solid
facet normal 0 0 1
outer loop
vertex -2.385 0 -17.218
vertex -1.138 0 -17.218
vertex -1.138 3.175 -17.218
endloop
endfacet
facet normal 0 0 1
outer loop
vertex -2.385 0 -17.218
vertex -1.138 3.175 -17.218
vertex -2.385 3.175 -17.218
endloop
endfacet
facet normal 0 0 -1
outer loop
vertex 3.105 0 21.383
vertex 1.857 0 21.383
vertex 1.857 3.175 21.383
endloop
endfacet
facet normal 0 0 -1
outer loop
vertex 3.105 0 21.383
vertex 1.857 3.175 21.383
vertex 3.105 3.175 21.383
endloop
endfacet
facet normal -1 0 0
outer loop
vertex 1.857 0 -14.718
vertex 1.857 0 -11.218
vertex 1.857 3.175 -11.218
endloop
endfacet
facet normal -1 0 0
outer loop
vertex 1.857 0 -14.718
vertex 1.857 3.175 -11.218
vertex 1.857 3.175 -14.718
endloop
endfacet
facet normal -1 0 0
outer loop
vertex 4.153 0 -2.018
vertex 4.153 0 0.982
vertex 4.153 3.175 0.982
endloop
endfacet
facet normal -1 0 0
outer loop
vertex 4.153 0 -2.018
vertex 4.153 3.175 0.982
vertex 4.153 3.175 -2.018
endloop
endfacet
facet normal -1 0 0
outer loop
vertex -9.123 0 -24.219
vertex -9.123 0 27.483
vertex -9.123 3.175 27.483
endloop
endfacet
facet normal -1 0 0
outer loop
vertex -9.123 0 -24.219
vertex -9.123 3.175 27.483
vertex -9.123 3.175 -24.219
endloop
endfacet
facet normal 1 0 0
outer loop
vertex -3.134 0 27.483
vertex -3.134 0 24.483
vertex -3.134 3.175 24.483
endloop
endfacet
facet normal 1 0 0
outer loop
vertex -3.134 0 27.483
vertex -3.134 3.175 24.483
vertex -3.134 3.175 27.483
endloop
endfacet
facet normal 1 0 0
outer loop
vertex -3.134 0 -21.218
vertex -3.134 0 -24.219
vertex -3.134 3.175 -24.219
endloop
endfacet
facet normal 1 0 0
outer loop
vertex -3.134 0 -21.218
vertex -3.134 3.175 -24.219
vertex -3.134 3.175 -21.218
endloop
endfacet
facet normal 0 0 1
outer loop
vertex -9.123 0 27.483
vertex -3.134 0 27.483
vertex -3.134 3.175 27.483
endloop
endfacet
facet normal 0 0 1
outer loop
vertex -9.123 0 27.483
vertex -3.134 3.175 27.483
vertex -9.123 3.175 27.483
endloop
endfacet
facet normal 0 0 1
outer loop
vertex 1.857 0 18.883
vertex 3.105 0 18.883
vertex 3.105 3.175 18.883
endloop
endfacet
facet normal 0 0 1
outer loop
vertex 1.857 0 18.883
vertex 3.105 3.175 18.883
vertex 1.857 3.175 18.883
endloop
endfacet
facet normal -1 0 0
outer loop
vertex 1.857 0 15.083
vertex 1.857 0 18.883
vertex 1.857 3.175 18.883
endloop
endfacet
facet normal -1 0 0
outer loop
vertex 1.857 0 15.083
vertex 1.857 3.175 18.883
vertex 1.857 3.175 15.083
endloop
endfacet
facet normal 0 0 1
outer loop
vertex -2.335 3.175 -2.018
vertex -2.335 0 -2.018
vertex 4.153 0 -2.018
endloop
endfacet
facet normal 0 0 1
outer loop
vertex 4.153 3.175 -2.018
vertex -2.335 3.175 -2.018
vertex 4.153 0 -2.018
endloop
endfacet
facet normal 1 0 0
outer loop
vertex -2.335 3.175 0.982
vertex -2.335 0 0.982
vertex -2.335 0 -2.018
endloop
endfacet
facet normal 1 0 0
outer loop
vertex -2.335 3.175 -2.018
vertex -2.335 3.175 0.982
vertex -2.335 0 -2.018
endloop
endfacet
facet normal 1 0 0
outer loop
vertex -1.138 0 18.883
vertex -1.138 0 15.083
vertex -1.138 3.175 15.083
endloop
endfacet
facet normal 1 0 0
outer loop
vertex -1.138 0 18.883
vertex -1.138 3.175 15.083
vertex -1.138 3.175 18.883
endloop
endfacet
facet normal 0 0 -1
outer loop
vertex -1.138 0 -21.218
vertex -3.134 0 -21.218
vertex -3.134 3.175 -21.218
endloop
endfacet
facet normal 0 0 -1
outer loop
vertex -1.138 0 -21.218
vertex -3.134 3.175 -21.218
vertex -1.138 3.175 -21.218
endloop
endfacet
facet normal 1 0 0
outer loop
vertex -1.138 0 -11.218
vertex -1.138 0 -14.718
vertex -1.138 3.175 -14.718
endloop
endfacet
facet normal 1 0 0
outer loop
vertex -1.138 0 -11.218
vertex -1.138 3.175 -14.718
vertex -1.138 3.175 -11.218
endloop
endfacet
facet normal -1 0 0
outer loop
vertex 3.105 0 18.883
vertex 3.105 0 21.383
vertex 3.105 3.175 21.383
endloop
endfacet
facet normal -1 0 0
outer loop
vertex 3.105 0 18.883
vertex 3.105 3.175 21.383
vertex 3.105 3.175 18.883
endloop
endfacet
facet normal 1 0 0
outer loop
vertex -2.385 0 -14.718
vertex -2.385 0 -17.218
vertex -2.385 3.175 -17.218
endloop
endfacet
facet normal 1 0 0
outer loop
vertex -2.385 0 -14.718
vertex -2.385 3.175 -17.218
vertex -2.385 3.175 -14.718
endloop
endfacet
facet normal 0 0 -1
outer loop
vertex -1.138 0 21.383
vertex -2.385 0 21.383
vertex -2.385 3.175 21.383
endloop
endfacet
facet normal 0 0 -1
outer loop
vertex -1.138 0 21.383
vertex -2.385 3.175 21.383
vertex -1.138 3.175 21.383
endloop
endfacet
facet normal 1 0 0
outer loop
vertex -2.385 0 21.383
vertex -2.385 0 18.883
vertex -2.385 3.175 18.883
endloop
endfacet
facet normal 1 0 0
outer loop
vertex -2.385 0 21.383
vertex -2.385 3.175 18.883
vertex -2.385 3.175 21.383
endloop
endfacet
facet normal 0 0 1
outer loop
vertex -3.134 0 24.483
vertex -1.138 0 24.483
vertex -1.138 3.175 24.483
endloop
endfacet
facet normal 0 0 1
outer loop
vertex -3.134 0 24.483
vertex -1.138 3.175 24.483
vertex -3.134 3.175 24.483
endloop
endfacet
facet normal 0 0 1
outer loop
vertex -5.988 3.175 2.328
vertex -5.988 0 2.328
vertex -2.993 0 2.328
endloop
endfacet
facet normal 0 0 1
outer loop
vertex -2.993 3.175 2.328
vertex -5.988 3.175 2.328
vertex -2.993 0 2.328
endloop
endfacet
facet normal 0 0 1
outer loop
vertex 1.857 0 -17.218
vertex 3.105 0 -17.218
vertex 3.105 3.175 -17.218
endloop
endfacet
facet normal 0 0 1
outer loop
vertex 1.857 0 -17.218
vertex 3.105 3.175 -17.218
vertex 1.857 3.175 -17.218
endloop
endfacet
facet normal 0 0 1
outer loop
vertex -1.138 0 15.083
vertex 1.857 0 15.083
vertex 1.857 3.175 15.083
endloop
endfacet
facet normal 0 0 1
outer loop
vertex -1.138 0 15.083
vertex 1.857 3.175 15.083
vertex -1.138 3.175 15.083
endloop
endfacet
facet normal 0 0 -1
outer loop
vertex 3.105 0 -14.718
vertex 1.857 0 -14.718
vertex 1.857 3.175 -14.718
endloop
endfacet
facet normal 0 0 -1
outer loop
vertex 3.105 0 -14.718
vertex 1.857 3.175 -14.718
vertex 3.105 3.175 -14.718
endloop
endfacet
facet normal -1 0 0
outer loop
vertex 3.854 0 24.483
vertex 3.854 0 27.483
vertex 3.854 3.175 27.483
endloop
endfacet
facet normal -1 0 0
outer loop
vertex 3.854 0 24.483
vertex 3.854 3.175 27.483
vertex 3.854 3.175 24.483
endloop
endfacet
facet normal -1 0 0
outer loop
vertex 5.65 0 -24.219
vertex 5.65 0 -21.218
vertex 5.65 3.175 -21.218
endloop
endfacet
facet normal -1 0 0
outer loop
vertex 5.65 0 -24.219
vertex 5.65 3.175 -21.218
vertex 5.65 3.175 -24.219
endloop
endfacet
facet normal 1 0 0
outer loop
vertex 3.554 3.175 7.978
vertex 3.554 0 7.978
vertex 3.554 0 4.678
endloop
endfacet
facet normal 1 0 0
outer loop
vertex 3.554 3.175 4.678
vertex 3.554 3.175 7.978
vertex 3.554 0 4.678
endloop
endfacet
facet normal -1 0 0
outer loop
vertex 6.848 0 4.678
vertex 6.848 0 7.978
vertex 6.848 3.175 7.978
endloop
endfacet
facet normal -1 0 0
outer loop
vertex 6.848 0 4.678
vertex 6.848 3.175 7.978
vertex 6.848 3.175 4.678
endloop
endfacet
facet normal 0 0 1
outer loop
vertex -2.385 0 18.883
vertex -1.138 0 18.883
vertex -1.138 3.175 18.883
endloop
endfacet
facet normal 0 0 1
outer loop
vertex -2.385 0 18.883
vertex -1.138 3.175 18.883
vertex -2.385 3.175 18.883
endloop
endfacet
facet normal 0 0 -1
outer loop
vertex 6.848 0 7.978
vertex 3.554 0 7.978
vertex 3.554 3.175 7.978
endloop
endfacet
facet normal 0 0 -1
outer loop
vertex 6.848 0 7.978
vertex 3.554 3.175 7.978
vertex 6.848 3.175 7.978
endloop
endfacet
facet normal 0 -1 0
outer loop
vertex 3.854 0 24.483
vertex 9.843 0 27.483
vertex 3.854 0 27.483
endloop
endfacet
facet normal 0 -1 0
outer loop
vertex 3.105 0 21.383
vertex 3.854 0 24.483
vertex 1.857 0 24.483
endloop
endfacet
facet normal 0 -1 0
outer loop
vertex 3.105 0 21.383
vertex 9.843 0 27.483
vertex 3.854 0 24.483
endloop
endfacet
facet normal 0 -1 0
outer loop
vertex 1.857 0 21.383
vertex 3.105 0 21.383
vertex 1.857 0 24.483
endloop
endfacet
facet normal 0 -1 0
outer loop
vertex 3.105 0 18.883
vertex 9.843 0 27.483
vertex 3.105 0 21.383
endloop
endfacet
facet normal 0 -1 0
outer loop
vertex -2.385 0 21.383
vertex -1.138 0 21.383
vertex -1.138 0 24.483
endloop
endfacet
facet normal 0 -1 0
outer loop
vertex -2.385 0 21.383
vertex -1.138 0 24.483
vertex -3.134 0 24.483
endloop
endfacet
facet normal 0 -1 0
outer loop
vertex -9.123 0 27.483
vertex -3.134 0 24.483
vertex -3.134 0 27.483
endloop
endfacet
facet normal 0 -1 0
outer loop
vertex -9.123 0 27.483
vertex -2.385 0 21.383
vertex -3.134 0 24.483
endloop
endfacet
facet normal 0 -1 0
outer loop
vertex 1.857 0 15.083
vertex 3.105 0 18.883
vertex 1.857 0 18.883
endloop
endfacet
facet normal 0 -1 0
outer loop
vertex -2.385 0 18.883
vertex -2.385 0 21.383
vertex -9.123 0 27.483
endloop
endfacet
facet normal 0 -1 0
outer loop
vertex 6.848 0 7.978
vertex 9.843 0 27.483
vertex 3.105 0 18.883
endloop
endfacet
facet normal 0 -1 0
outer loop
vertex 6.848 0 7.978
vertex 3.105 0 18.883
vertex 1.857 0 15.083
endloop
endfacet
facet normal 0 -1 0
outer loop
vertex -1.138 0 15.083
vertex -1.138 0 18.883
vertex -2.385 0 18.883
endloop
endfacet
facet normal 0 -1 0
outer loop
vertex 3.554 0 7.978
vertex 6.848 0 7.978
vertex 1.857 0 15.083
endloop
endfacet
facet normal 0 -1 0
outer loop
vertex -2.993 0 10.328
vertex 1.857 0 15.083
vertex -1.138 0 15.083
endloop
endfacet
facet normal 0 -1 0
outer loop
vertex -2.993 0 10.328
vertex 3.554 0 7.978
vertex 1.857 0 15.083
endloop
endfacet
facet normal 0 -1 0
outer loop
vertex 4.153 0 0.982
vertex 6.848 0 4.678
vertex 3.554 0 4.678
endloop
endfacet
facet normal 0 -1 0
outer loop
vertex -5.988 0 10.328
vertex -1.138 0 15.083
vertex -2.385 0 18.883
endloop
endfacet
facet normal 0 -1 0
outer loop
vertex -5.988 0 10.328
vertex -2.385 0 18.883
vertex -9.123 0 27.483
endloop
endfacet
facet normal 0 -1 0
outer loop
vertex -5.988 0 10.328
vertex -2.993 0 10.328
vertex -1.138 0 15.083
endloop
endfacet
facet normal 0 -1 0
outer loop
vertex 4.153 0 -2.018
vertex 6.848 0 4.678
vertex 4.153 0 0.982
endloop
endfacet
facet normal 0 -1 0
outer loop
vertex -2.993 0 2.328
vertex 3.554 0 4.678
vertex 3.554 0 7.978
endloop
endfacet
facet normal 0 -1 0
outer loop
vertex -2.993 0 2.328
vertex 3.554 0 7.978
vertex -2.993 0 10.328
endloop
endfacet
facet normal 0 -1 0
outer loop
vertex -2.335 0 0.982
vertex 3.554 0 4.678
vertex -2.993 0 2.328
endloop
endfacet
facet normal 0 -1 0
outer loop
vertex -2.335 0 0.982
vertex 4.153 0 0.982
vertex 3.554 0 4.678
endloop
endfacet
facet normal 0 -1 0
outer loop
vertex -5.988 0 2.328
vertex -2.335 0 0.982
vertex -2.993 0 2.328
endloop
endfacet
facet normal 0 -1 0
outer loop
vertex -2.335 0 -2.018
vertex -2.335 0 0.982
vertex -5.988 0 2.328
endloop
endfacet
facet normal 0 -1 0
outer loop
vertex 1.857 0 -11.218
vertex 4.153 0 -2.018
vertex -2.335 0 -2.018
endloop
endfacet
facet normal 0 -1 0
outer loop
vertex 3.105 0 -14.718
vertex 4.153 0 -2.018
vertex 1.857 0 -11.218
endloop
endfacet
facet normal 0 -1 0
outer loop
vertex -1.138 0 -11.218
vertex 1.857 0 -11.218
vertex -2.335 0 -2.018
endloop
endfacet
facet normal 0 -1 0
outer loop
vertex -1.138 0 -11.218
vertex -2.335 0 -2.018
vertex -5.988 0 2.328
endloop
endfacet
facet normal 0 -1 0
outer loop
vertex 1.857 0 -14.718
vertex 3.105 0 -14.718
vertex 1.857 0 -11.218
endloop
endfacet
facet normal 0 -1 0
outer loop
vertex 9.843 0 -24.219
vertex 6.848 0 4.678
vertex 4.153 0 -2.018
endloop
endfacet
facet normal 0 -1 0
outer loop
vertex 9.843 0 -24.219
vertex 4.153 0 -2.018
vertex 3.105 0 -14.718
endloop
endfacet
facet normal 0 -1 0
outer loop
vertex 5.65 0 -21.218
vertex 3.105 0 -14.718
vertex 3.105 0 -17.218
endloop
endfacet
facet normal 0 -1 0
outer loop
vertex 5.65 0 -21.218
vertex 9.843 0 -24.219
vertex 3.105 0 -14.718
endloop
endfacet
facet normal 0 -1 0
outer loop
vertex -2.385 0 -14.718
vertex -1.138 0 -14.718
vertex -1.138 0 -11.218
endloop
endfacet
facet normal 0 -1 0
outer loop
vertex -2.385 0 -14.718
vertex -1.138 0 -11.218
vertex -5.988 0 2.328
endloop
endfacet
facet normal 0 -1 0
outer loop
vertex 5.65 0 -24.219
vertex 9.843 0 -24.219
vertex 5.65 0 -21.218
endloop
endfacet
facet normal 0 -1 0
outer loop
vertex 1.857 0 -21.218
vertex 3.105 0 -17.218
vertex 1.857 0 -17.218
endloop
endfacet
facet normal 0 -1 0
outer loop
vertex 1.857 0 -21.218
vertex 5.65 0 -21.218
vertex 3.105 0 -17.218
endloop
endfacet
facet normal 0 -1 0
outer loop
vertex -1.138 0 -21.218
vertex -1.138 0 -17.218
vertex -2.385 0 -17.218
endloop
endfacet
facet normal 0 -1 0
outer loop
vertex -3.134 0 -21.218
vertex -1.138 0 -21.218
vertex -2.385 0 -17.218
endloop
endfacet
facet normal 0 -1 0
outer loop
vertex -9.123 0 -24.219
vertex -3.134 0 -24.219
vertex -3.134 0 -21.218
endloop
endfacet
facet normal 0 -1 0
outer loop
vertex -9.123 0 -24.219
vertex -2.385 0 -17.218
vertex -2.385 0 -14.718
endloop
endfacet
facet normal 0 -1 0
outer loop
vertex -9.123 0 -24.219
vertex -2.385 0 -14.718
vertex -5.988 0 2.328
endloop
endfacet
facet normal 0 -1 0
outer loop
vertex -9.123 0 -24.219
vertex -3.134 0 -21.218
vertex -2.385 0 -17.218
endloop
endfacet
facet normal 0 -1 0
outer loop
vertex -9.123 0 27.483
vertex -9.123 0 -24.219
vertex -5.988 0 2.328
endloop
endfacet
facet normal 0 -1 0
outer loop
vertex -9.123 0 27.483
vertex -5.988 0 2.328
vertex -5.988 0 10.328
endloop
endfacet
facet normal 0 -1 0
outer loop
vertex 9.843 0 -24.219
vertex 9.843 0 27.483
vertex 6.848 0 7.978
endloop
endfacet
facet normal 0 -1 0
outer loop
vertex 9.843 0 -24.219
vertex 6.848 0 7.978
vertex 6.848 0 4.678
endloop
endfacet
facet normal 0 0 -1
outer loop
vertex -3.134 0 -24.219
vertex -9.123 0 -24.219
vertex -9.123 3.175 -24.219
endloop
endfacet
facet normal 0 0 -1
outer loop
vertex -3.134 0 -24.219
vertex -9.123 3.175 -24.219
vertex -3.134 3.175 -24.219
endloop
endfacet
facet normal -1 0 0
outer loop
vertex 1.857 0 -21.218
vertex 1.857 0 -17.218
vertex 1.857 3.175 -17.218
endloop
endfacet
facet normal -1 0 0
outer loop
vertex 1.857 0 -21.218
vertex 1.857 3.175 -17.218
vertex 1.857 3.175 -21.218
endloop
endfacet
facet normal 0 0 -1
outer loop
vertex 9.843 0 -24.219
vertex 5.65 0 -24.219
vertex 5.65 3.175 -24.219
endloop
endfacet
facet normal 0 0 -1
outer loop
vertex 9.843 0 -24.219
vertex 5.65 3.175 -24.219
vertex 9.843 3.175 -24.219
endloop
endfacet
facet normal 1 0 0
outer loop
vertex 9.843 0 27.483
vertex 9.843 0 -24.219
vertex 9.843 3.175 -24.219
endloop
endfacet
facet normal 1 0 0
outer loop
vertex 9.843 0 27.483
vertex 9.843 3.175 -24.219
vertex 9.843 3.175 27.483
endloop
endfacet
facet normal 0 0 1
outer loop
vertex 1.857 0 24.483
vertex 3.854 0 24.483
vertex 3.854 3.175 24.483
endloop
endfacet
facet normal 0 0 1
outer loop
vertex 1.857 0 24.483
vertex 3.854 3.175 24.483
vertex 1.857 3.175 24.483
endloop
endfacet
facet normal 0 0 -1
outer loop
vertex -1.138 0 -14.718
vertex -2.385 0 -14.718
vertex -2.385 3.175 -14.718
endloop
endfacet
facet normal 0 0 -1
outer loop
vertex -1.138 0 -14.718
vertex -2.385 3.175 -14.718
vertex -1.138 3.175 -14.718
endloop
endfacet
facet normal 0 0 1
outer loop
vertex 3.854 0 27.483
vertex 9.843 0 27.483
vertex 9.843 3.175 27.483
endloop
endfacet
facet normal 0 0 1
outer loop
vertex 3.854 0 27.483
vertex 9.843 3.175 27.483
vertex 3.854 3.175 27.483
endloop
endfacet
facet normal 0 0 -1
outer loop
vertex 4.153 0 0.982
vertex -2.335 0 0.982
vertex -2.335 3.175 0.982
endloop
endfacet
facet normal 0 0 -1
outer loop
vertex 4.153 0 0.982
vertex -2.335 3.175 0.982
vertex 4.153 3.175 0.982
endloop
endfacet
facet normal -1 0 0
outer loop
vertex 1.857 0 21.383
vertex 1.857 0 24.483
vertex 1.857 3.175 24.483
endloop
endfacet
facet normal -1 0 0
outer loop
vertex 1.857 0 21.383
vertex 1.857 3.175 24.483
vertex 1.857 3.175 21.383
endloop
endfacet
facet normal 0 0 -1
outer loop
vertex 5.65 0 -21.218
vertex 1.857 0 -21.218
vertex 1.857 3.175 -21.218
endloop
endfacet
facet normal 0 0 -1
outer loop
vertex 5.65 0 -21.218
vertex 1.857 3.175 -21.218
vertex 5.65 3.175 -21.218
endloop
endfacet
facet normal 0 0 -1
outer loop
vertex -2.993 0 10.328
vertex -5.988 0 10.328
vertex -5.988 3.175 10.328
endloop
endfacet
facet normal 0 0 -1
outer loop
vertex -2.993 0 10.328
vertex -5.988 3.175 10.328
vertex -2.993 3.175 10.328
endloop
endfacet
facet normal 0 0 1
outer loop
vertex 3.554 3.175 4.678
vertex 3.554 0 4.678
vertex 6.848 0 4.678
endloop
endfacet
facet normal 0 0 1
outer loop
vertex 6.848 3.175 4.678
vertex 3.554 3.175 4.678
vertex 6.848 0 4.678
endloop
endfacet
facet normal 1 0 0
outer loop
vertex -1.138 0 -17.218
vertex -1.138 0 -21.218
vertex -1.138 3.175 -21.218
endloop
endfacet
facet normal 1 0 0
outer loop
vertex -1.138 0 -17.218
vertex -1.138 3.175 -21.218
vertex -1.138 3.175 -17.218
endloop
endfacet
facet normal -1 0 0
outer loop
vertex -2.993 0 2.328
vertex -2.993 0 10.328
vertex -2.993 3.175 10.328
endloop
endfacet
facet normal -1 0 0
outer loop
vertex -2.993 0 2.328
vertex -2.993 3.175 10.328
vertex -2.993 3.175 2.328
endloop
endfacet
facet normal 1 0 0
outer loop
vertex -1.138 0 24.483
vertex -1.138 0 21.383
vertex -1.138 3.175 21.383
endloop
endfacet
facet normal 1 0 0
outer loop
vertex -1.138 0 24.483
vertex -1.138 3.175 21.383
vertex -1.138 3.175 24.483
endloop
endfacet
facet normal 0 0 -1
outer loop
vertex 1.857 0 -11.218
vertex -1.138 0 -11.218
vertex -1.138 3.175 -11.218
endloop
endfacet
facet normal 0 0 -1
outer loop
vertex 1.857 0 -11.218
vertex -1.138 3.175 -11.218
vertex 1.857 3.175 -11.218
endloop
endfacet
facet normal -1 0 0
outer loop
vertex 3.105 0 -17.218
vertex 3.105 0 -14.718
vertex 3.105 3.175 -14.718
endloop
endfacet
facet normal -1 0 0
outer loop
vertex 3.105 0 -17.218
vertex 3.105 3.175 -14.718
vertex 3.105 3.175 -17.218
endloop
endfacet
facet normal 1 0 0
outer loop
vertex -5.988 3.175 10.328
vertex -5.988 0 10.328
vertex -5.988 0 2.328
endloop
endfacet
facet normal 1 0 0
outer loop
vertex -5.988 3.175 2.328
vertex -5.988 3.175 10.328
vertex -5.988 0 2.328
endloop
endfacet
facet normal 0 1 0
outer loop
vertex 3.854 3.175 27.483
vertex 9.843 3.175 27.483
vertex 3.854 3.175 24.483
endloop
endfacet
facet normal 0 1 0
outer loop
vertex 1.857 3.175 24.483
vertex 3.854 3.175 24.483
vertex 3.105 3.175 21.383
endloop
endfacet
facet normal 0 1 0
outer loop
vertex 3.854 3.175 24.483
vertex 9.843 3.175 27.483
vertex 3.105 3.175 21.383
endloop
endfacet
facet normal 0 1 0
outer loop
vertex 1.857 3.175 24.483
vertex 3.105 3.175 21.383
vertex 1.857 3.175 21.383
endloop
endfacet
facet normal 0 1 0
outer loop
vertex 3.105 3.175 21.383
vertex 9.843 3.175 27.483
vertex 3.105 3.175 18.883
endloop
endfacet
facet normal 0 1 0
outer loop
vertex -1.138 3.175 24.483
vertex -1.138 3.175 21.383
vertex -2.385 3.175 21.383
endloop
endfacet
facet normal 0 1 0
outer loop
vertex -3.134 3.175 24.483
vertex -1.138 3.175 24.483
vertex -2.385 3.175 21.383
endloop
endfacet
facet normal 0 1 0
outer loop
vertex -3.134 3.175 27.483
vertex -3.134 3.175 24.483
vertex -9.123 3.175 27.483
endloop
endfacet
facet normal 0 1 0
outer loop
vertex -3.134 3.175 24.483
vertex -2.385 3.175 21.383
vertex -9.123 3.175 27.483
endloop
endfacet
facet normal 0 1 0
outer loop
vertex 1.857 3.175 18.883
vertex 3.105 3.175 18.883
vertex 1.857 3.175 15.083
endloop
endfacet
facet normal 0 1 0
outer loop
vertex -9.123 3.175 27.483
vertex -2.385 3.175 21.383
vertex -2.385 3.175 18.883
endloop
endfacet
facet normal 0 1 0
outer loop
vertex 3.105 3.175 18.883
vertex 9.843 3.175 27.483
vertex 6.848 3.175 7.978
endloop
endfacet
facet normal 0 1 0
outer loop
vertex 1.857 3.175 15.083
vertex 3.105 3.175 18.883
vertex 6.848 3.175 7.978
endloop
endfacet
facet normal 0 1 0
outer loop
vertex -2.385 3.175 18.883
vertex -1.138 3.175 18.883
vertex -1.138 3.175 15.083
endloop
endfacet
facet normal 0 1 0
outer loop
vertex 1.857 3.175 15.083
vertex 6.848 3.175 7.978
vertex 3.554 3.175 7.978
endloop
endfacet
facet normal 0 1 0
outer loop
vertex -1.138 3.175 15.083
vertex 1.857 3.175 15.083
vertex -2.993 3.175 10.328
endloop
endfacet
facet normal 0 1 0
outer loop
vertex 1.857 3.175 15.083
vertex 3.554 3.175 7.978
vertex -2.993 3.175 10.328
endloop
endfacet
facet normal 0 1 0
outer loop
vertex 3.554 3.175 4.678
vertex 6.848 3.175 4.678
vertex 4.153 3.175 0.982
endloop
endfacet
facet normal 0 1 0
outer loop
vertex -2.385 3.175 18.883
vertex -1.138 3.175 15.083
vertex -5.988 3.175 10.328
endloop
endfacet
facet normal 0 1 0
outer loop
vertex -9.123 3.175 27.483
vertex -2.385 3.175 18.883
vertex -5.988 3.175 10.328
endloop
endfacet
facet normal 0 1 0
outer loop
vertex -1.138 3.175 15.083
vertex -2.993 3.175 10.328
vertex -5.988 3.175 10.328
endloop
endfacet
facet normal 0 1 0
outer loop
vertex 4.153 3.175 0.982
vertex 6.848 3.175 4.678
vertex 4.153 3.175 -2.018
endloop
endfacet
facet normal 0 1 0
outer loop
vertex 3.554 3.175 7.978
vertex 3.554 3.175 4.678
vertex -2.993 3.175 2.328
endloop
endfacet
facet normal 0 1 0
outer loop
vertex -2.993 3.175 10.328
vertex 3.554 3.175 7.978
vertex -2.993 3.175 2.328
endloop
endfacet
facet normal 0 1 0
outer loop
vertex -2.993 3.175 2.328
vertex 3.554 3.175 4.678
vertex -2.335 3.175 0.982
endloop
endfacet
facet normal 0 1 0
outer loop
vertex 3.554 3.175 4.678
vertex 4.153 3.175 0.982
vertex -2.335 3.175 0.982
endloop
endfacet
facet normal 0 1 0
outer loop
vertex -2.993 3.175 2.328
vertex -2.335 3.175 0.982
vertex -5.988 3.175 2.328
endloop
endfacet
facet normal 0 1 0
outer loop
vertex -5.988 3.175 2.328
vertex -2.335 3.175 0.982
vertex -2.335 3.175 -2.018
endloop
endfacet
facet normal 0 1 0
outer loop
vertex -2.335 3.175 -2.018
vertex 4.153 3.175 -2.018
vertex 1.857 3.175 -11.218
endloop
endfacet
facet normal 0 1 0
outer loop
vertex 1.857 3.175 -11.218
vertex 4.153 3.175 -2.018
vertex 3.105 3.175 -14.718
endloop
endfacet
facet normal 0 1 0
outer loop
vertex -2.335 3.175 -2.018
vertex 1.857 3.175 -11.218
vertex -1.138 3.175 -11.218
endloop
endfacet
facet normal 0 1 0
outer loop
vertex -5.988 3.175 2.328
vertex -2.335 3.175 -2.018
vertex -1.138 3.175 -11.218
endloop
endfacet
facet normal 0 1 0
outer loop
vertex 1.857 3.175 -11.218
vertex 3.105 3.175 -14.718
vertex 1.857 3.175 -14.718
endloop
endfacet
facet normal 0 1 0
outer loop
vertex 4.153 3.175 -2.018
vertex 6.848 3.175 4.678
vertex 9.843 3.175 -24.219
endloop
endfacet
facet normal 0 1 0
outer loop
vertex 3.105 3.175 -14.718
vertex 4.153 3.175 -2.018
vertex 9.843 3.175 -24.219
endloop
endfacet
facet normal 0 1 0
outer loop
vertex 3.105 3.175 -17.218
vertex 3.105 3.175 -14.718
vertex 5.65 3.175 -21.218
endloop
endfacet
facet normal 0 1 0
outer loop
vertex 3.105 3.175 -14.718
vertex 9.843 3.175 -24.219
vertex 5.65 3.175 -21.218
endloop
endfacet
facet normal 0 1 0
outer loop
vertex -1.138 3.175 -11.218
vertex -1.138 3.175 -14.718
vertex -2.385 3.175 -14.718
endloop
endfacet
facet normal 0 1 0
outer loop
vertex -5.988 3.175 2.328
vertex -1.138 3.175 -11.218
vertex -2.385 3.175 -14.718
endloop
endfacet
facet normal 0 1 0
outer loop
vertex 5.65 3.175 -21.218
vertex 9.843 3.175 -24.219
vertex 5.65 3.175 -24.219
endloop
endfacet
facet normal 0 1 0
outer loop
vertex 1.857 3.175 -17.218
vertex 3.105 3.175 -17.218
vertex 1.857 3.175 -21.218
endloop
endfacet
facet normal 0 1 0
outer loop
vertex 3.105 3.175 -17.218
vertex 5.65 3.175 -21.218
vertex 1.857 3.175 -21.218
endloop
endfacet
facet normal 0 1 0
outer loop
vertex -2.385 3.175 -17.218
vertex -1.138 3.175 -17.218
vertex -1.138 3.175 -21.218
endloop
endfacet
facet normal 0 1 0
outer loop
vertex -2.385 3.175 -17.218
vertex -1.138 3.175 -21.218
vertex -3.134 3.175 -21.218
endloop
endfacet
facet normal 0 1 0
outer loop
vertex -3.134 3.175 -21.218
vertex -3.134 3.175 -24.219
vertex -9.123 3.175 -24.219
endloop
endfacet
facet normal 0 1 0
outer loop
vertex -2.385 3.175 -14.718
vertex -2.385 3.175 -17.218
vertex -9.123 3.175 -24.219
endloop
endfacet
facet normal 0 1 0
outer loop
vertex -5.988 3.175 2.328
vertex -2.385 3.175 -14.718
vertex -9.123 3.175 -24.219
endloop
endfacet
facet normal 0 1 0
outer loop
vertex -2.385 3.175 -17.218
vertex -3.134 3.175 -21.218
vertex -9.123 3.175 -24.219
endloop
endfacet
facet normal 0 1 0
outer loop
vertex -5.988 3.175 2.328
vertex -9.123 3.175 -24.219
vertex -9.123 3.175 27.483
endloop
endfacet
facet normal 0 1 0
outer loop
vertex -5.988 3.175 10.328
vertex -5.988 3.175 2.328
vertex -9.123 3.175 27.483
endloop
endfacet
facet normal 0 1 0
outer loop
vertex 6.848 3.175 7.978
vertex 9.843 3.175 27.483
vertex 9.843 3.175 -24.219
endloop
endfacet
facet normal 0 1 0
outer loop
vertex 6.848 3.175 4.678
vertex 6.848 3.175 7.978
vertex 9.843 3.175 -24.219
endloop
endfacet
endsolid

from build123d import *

# Parameters (mm, degrees)
SKETCH1_W           = 2.994660031
SKETCH1_H           = 8.000362858
SKETCH1_W_2         = 3.294225957
SKETCH1_H_2         = 3.300262419
SKETCH1_W_3         = 6.488474747
SKETCH1_H_3         = 2.999948682
BOSS_EXTRUDE1_DEPTH = 3.175


with BuildPart() as part:
    # Sketch1 → Boss-Extrude1 (new body)
    with BuildSketch(Plane(origin=(0, 0, 0), x_dir=(1, 0, 0), z_dir=(0, 1, 0))):
        Polygon((-3.134063131, -27.4833399), (-9.123310076, -27.4833399), (-9.123310076, 24.218538917), (-3.134063129, 24.218538917), (-3.134063129, 21.21845839), (-1.137605236, 21.21845839), (-1.137605236, 17.218250104), (-2.3854164, 17.218250104), (-2.3854164, 14.718365303), (-1.137605236, 14.718365303), (-1.137605236, 11.218216013), (1.857303385, 11.218216013), (1.857303385, 14.718365303), (3.105051182, 14.718365303), (3.105051182, 17.218250104), (1.857303385, 17.218250104), (1.857303385, 21.21845839), (5.650440312, 21.21845839), (5.650440312, 24.218538917), (9.842944855, 24.218538917), (9.842944855, -27.4833399), (3.853571177, -27.4833399), (3.853571177, -24.483195893), (1.857303382, -24.483195893), (1.857303382, -21.383140191), (3.10505118, -21.383140191), (3.10505118, -18.883001466), (1.857303382, -18.883001466), (1.857303382, -15.082802129), (-1.137605238, -15.082802129), (-1.137605238, -18.883001466), (-2.385416402, -18.883001466), (-2.385416402, -21.383140191), (-1.137605238, -21.383140191), (-1.137605238, -24.483195893), (-3.134063131, -24.483195893), align=None)
        with Locations((-4.490515563, -6.328244045)):
            Rectangle(SKETCH1_W, SKETCH1_H, mode=Mode.SUBTRACT)
        with Locations((5.201303454, -6.328244045)):
            Rectangle(SKETCH1_W_2, SKETCH1_H_2, mode=Mode.SUBTRACT)
        with Locations((0.908846113, 0.517732338)):
            Rectangle(SKETCH1_W_3, SKETCH1_H_3, mode=Mode.SUBTRACT)
    extrude(amount=BOSS_EXTRUDE1_DEPTH)


solid = part.part
